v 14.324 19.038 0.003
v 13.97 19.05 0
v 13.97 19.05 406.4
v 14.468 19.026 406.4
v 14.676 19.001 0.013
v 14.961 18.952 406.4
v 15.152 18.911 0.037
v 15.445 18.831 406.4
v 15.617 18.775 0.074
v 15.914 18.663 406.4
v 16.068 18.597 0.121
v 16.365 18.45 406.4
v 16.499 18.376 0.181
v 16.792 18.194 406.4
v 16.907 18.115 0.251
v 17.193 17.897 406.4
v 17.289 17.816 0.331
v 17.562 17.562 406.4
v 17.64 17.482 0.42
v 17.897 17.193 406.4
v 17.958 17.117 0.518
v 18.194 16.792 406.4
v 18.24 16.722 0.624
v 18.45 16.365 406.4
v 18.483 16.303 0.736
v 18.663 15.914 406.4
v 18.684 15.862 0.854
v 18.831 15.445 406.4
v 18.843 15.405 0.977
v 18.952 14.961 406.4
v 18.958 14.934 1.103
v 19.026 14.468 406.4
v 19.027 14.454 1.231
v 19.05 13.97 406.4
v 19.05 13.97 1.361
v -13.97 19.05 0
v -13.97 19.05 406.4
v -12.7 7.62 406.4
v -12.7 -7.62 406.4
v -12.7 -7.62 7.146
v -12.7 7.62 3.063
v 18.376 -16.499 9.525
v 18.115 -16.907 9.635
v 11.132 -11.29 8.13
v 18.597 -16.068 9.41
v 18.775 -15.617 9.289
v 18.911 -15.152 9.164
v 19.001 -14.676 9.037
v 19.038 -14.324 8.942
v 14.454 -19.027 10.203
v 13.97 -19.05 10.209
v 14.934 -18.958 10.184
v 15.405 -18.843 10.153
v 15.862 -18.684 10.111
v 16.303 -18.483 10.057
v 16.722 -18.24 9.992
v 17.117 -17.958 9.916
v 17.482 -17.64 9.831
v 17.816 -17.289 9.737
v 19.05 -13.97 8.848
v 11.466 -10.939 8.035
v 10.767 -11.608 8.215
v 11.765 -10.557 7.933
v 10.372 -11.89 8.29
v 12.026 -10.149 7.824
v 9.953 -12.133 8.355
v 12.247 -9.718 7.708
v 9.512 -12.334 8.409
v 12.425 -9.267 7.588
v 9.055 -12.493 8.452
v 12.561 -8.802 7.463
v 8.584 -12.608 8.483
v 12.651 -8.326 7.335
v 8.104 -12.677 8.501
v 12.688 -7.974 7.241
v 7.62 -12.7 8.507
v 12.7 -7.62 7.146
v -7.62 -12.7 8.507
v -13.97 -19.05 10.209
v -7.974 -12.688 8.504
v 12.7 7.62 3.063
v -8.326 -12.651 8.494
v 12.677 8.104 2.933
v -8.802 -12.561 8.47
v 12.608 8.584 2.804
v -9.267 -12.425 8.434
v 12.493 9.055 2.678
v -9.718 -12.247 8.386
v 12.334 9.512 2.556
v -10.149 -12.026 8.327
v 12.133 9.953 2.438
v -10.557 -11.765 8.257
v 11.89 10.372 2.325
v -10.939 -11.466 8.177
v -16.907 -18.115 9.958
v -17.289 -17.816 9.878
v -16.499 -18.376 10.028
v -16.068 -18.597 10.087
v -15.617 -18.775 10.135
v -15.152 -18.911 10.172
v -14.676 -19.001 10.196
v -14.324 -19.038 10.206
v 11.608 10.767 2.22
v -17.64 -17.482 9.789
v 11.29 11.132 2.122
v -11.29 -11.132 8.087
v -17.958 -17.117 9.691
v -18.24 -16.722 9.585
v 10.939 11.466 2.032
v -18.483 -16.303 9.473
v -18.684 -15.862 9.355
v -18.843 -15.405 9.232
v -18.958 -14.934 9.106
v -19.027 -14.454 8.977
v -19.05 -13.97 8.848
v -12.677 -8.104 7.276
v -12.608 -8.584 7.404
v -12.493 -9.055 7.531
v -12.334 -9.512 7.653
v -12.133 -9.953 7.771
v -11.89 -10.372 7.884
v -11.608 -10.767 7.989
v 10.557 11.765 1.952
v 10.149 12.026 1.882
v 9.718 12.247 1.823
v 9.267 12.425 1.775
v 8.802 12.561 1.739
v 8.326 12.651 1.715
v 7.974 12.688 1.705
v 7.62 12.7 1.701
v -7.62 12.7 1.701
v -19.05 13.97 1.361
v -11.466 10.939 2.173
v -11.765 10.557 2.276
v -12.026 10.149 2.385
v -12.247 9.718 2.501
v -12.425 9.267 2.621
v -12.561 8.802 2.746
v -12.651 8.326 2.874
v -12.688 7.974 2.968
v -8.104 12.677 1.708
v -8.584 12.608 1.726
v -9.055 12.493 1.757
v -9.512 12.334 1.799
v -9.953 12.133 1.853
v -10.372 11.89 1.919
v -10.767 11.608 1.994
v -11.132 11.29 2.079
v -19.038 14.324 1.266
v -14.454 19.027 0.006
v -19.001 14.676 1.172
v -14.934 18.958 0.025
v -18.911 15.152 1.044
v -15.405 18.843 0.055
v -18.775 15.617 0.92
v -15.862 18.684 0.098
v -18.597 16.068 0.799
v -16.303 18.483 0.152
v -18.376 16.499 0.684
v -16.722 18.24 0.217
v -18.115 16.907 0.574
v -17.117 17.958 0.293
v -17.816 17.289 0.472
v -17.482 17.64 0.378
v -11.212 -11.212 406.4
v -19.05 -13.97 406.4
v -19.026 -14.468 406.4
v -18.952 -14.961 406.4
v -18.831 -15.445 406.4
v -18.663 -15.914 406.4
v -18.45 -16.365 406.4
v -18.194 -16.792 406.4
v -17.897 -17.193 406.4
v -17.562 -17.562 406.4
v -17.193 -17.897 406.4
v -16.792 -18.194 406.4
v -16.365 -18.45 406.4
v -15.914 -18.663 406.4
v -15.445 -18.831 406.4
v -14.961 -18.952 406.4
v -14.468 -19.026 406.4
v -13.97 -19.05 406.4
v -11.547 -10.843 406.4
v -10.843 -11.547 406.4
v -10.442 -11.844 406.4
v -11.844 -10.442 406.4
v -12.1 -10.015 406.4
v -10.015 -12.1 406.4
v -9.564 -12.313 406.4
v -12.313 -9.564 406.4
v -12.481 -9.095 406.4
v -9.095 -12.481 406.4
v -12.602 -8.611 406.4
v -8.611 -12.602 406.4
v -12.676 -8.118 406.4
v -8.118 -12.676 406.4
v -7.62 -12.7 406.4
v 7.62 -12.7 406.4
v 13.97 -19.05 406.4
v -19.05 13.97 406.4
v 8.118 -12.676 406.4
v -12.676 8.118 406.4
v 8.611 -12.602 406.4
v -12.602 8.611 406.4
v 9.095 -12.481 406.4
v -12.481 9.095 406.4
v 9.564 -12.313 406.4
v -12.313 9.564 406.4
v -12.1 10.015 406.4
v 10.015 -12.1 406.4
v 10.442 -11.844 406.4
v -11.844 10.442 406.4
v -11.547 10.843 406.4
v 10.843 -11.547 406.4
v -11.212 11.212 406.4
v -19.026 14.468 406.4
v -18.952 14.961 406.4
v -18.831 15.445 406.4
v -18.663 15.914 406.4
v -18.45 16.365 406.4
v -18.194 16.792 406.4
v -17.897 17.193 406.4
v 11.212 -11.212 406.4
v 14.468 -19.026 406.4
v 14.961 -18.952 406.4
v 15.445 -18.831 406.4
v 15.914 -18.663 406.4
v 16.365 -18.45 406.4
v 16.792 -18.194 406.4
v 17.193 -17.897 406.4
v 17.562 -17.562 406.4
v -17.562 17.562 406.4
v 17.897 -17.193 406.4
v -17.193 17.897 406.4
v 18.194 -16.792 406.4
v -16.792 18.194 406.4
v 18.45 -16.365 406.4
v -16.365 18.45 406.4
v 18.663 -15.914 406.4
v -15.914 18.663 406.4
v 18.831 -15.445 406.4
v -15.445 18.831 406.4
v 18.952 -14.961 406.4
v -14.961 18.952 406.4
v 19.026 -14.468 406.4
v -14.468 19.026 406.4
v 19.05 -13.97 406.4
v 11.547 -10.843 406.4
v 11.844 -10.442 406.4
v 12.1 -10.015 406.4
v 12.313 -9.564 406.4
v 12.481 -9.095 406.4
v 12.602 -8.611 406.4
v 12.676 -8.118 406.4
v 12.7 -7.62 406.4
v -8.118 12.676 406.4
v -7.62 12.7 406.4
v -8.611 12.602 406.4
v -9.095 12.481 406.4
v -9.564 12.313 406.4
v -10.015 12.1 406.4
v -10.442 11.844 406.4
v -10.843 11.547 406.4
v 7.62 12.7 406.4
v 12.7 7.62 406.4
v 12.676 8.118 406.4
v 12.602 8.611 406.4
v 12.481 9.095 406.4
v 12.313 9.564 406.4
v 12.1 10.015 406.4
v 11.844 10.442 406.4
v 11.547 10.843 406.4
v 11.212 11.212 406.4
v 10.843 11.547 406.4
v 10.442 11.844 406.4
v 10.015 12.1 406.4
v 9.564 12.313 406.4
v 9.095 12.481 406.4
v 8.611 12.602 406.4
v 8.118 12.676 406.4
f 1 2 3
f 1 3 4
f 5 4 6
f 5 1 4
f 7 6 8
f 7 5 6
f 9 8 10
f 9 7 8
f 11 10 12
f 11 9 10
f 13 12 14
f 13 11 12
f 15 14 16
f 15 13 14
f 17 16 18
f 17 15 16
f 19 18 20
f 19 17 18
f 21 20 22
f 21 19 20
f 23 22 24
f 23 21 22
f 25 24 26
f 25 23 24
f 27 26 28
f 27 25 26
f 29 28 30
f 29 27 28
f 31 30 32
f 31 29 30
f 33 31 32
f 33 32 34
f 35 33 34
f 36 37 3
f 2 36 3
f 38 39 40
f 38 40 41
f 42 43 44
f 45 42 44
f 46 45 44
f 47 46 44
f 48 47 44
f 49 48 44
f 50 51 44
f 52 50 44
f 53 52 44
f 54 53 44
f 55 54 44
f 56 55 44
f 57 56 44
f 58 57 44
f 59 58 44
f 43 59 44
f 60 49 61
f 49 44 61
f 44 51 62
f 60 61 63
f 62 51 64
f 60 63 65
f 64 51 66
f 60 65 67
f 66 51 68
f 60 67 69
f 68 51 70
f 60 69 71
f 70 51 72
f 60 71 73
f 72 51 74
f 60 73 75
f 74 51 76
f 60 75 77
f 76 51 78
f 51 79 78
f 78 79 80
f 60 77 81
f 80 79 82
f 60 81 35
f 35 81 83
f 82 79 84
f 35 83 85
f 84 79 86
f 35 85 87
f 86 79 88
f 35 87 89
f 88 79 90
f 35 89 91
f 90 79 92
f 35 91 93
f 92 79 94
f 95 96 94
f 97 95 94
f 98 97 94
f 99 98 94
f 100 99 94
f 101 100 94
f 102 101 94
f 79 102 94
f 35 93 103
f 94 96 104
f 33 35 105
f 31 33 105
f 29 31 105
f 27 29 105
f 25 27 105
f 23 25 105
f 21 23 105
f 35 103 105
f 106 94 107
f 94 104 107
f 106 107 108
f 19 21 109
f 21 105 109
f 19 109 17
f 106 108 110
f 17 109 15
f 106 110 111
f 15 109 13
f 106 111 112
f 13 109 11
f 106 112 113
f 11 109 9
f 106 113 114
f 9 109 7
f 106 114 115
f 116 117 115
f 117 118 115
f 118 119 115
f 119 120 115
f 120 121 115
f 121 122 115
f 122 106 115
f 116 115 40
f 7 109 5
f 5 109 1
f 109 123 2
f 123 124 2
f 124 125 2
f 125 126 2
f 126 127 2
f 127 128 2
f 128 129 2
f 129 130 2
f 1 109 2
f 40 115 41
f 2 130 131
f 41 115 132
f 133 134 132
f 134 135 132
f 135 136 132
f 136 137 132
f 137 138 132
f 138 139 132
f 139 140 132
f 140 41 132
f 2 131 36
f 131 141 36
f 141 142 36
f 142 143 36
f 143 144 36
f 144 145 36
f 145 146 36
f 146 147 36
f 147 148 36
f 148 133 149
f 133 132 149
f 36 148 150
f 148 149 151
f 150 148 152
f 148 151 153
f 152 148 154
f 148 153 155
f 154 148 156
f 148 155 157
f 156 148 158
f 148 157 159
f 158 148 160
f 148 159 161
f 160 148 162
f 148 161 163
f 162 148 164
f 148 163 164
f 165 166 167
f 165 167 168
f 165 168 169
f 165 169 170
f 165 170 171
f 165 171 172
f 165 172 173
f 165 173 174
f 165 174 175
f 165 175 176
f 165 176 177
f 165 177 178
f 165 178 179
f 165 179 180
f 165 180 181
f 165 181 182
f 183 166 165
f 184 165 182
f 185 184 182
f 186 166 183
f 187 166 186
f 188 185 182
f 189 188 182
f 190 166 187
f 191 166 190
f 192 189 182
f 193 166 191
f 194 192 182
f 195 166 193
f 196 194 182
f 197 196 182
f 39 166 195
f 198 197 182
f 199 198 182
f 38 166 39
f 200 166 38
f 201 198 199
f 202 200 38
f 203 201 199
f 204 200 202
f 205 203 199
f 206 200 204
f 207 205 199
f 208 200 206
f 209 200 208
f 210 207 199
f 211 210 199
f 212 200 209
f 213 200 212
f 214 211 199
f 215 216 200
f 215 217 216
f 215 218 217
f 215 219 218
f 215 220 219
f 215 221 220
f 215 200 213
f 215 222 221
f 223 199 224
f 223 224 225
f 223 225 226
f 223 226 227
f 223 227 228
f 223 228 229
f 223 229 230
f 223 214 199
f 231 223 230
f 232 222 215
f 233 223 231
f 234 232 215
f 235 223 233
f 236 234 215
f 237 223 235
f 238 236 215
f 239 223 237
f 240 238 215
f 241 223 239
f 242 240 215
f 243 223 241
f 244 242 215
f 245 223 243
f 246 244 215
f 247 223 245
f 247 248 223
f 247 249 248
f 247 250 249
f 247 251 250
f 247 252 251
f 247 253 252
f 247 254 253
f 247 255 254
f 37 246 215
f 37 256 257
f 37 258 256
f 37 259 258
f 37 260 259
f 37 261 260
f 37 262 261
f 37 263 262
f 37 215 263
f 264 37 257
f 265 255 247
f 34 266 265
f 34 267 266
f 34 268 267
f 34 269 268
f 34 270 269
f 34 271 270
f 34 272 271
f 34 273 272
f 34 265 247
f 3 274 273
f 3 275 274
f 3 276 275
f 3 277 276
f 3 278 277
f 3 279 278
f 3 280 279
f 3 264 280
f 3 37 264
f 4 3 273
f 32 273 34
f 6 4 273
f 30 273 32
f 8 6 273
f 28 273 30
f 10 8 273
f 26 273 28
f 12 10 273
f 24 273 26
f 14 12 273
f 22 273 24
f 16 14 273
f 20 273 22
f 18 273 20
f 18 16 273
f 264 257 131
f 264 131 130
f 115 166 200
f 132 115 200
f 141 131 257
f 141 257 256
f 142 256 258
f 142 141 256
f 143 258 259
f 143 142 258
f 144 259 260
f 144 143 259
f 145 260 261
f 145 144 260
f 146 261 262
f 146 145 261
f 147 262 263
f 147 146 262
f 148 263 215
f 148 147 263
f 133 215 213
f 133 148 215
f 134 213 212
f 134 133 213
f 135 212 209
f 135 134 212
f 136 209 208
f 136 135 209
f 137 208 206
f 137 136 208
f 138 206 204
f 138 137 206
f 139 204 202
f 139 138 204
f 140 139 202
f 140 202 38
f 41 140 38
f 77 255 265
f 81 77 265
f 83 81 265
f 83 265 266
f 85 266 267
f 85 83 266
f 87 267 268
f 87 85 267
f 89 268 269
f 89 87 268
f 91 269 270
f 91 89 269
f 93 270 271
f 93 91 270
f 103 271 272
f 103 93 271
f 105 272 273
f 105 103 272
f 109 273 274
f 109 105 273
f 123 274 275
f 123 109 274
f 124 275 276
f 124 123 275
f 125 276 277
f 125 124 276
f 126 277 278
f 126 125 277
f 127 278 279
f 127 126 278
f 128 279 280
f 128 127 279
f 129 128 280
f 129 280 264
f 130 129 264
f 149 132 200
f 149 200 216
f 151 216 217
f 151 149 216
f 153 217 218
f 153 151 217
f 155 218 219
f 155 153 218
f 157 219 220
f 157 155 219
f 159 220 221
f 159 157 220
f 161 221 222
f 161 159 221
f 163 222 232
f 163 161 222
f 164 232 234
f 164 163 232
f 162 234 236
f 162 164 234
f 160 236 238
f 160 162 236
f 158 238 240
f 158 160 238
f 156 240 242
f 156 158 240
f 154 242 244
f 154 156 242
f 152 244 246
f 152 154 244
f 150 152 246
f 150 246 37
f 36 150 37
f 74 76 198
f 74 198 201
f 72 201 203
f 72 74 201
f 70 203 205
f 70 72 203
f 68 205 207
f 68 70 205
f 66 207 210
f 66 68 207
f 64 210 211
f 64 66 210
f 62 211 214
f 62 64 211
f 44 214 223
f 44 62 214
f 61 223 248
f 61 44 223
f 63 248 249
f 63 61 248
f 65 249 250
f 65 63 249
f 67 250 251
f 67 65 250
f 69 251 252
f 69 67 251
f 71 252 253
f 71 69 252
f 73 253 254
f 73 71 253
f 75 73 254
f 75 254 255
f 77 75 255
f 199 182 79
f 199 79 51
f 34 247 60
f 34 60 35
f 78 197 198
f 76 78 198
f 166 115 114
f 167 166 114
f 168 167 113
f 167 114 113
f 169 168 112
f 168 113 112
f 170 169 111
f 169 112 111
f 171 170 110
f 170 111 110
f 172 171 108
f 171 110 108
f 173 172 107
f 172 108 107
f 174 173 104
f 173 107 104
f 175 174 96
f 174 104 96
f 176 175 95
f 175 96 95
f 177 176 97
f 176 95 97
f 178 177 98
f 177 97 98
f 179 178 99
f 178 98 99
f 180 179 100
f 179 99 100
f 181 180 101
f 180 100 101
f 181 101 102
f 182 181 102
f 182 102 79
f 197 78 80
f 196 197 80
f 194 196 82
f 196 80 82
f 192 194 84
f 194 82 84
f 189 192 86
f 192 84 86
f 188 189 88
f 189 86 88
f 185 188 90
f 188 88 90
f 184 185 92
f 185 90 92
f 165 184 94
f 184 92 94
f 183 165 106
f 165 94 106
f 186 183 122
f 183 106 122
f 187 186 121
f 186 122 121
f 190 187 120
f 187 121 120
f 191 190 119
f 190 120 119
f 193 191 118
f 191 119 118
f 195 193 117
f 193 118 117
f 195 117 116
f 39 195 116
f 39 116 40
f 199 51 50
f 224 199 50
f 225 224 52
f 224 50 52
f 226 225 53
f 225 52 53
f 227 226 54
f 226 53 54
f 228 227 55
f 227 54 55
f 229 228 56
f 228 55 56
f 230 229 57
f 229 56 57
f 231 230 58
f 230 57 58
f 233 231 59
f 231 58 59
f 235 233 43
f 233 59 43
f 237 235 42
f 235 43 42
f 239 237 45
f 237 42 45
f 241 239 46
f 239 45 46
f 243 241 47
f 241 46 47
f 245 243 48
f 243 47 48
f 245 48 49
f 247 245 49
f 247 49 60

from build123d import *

# Parameters (mm, degrees)
F0_W     = 38.1
F0_H     = 38.1
F0_W_2   = 25.4
F0_H_2   = 25.4
F1_DEPTH = 203.2
F2_R     = 5.08
F5_DEPTH = 38.1


with BuildPart() as f1:
    # F0 (on Top) → F1 (new body)
    with BuildSketch(Plane.XY):
        Rectangle(F0_W, F0_H)
        Rectangle(F0_W_2, F0_H_2, mode=Mode.SUBTRACT)
    extrude(amount=F1_DEPTH)

    # F2
    f2_edges = [f1.edges().sort_by_distance(p)[0] for p in [
        (-19.05, 19.05, 101.6),
        (-19.05, -19.05, 101.6),
        (19.05, -19.05, 101.6),
        (19.05, 19.05, 101.6),
        (-12.7, 12.7, 101.6),
        (12.7, 12.7, 101.6),
        (12.7, -12.7, 101.6),
        (-12.7, -12.7, 101.6),
    ]]
    fillet(f2_edges, radius=F2_R)

    # F3: F1 across face


with BuildPart() as f1_1:
    add(f1.part)
    add(f1.part.mirror(Plane.XY.offset(203.2)))

    # F4 (on face) → F5 (cut, through all)
    with BuildSketch(Plane(origin=(-19.05, 0, 0), x_dir=(0, -1, 0), z_dir=(-1, 0, 0))):
        Polygon((19.05, 10.208864), (-19.05, 0), (19.05, 0), align=None)
    extrude(amount=-F5_DEPTH, mode=Mode.SUBTRACT)


solid = f1_1.part
